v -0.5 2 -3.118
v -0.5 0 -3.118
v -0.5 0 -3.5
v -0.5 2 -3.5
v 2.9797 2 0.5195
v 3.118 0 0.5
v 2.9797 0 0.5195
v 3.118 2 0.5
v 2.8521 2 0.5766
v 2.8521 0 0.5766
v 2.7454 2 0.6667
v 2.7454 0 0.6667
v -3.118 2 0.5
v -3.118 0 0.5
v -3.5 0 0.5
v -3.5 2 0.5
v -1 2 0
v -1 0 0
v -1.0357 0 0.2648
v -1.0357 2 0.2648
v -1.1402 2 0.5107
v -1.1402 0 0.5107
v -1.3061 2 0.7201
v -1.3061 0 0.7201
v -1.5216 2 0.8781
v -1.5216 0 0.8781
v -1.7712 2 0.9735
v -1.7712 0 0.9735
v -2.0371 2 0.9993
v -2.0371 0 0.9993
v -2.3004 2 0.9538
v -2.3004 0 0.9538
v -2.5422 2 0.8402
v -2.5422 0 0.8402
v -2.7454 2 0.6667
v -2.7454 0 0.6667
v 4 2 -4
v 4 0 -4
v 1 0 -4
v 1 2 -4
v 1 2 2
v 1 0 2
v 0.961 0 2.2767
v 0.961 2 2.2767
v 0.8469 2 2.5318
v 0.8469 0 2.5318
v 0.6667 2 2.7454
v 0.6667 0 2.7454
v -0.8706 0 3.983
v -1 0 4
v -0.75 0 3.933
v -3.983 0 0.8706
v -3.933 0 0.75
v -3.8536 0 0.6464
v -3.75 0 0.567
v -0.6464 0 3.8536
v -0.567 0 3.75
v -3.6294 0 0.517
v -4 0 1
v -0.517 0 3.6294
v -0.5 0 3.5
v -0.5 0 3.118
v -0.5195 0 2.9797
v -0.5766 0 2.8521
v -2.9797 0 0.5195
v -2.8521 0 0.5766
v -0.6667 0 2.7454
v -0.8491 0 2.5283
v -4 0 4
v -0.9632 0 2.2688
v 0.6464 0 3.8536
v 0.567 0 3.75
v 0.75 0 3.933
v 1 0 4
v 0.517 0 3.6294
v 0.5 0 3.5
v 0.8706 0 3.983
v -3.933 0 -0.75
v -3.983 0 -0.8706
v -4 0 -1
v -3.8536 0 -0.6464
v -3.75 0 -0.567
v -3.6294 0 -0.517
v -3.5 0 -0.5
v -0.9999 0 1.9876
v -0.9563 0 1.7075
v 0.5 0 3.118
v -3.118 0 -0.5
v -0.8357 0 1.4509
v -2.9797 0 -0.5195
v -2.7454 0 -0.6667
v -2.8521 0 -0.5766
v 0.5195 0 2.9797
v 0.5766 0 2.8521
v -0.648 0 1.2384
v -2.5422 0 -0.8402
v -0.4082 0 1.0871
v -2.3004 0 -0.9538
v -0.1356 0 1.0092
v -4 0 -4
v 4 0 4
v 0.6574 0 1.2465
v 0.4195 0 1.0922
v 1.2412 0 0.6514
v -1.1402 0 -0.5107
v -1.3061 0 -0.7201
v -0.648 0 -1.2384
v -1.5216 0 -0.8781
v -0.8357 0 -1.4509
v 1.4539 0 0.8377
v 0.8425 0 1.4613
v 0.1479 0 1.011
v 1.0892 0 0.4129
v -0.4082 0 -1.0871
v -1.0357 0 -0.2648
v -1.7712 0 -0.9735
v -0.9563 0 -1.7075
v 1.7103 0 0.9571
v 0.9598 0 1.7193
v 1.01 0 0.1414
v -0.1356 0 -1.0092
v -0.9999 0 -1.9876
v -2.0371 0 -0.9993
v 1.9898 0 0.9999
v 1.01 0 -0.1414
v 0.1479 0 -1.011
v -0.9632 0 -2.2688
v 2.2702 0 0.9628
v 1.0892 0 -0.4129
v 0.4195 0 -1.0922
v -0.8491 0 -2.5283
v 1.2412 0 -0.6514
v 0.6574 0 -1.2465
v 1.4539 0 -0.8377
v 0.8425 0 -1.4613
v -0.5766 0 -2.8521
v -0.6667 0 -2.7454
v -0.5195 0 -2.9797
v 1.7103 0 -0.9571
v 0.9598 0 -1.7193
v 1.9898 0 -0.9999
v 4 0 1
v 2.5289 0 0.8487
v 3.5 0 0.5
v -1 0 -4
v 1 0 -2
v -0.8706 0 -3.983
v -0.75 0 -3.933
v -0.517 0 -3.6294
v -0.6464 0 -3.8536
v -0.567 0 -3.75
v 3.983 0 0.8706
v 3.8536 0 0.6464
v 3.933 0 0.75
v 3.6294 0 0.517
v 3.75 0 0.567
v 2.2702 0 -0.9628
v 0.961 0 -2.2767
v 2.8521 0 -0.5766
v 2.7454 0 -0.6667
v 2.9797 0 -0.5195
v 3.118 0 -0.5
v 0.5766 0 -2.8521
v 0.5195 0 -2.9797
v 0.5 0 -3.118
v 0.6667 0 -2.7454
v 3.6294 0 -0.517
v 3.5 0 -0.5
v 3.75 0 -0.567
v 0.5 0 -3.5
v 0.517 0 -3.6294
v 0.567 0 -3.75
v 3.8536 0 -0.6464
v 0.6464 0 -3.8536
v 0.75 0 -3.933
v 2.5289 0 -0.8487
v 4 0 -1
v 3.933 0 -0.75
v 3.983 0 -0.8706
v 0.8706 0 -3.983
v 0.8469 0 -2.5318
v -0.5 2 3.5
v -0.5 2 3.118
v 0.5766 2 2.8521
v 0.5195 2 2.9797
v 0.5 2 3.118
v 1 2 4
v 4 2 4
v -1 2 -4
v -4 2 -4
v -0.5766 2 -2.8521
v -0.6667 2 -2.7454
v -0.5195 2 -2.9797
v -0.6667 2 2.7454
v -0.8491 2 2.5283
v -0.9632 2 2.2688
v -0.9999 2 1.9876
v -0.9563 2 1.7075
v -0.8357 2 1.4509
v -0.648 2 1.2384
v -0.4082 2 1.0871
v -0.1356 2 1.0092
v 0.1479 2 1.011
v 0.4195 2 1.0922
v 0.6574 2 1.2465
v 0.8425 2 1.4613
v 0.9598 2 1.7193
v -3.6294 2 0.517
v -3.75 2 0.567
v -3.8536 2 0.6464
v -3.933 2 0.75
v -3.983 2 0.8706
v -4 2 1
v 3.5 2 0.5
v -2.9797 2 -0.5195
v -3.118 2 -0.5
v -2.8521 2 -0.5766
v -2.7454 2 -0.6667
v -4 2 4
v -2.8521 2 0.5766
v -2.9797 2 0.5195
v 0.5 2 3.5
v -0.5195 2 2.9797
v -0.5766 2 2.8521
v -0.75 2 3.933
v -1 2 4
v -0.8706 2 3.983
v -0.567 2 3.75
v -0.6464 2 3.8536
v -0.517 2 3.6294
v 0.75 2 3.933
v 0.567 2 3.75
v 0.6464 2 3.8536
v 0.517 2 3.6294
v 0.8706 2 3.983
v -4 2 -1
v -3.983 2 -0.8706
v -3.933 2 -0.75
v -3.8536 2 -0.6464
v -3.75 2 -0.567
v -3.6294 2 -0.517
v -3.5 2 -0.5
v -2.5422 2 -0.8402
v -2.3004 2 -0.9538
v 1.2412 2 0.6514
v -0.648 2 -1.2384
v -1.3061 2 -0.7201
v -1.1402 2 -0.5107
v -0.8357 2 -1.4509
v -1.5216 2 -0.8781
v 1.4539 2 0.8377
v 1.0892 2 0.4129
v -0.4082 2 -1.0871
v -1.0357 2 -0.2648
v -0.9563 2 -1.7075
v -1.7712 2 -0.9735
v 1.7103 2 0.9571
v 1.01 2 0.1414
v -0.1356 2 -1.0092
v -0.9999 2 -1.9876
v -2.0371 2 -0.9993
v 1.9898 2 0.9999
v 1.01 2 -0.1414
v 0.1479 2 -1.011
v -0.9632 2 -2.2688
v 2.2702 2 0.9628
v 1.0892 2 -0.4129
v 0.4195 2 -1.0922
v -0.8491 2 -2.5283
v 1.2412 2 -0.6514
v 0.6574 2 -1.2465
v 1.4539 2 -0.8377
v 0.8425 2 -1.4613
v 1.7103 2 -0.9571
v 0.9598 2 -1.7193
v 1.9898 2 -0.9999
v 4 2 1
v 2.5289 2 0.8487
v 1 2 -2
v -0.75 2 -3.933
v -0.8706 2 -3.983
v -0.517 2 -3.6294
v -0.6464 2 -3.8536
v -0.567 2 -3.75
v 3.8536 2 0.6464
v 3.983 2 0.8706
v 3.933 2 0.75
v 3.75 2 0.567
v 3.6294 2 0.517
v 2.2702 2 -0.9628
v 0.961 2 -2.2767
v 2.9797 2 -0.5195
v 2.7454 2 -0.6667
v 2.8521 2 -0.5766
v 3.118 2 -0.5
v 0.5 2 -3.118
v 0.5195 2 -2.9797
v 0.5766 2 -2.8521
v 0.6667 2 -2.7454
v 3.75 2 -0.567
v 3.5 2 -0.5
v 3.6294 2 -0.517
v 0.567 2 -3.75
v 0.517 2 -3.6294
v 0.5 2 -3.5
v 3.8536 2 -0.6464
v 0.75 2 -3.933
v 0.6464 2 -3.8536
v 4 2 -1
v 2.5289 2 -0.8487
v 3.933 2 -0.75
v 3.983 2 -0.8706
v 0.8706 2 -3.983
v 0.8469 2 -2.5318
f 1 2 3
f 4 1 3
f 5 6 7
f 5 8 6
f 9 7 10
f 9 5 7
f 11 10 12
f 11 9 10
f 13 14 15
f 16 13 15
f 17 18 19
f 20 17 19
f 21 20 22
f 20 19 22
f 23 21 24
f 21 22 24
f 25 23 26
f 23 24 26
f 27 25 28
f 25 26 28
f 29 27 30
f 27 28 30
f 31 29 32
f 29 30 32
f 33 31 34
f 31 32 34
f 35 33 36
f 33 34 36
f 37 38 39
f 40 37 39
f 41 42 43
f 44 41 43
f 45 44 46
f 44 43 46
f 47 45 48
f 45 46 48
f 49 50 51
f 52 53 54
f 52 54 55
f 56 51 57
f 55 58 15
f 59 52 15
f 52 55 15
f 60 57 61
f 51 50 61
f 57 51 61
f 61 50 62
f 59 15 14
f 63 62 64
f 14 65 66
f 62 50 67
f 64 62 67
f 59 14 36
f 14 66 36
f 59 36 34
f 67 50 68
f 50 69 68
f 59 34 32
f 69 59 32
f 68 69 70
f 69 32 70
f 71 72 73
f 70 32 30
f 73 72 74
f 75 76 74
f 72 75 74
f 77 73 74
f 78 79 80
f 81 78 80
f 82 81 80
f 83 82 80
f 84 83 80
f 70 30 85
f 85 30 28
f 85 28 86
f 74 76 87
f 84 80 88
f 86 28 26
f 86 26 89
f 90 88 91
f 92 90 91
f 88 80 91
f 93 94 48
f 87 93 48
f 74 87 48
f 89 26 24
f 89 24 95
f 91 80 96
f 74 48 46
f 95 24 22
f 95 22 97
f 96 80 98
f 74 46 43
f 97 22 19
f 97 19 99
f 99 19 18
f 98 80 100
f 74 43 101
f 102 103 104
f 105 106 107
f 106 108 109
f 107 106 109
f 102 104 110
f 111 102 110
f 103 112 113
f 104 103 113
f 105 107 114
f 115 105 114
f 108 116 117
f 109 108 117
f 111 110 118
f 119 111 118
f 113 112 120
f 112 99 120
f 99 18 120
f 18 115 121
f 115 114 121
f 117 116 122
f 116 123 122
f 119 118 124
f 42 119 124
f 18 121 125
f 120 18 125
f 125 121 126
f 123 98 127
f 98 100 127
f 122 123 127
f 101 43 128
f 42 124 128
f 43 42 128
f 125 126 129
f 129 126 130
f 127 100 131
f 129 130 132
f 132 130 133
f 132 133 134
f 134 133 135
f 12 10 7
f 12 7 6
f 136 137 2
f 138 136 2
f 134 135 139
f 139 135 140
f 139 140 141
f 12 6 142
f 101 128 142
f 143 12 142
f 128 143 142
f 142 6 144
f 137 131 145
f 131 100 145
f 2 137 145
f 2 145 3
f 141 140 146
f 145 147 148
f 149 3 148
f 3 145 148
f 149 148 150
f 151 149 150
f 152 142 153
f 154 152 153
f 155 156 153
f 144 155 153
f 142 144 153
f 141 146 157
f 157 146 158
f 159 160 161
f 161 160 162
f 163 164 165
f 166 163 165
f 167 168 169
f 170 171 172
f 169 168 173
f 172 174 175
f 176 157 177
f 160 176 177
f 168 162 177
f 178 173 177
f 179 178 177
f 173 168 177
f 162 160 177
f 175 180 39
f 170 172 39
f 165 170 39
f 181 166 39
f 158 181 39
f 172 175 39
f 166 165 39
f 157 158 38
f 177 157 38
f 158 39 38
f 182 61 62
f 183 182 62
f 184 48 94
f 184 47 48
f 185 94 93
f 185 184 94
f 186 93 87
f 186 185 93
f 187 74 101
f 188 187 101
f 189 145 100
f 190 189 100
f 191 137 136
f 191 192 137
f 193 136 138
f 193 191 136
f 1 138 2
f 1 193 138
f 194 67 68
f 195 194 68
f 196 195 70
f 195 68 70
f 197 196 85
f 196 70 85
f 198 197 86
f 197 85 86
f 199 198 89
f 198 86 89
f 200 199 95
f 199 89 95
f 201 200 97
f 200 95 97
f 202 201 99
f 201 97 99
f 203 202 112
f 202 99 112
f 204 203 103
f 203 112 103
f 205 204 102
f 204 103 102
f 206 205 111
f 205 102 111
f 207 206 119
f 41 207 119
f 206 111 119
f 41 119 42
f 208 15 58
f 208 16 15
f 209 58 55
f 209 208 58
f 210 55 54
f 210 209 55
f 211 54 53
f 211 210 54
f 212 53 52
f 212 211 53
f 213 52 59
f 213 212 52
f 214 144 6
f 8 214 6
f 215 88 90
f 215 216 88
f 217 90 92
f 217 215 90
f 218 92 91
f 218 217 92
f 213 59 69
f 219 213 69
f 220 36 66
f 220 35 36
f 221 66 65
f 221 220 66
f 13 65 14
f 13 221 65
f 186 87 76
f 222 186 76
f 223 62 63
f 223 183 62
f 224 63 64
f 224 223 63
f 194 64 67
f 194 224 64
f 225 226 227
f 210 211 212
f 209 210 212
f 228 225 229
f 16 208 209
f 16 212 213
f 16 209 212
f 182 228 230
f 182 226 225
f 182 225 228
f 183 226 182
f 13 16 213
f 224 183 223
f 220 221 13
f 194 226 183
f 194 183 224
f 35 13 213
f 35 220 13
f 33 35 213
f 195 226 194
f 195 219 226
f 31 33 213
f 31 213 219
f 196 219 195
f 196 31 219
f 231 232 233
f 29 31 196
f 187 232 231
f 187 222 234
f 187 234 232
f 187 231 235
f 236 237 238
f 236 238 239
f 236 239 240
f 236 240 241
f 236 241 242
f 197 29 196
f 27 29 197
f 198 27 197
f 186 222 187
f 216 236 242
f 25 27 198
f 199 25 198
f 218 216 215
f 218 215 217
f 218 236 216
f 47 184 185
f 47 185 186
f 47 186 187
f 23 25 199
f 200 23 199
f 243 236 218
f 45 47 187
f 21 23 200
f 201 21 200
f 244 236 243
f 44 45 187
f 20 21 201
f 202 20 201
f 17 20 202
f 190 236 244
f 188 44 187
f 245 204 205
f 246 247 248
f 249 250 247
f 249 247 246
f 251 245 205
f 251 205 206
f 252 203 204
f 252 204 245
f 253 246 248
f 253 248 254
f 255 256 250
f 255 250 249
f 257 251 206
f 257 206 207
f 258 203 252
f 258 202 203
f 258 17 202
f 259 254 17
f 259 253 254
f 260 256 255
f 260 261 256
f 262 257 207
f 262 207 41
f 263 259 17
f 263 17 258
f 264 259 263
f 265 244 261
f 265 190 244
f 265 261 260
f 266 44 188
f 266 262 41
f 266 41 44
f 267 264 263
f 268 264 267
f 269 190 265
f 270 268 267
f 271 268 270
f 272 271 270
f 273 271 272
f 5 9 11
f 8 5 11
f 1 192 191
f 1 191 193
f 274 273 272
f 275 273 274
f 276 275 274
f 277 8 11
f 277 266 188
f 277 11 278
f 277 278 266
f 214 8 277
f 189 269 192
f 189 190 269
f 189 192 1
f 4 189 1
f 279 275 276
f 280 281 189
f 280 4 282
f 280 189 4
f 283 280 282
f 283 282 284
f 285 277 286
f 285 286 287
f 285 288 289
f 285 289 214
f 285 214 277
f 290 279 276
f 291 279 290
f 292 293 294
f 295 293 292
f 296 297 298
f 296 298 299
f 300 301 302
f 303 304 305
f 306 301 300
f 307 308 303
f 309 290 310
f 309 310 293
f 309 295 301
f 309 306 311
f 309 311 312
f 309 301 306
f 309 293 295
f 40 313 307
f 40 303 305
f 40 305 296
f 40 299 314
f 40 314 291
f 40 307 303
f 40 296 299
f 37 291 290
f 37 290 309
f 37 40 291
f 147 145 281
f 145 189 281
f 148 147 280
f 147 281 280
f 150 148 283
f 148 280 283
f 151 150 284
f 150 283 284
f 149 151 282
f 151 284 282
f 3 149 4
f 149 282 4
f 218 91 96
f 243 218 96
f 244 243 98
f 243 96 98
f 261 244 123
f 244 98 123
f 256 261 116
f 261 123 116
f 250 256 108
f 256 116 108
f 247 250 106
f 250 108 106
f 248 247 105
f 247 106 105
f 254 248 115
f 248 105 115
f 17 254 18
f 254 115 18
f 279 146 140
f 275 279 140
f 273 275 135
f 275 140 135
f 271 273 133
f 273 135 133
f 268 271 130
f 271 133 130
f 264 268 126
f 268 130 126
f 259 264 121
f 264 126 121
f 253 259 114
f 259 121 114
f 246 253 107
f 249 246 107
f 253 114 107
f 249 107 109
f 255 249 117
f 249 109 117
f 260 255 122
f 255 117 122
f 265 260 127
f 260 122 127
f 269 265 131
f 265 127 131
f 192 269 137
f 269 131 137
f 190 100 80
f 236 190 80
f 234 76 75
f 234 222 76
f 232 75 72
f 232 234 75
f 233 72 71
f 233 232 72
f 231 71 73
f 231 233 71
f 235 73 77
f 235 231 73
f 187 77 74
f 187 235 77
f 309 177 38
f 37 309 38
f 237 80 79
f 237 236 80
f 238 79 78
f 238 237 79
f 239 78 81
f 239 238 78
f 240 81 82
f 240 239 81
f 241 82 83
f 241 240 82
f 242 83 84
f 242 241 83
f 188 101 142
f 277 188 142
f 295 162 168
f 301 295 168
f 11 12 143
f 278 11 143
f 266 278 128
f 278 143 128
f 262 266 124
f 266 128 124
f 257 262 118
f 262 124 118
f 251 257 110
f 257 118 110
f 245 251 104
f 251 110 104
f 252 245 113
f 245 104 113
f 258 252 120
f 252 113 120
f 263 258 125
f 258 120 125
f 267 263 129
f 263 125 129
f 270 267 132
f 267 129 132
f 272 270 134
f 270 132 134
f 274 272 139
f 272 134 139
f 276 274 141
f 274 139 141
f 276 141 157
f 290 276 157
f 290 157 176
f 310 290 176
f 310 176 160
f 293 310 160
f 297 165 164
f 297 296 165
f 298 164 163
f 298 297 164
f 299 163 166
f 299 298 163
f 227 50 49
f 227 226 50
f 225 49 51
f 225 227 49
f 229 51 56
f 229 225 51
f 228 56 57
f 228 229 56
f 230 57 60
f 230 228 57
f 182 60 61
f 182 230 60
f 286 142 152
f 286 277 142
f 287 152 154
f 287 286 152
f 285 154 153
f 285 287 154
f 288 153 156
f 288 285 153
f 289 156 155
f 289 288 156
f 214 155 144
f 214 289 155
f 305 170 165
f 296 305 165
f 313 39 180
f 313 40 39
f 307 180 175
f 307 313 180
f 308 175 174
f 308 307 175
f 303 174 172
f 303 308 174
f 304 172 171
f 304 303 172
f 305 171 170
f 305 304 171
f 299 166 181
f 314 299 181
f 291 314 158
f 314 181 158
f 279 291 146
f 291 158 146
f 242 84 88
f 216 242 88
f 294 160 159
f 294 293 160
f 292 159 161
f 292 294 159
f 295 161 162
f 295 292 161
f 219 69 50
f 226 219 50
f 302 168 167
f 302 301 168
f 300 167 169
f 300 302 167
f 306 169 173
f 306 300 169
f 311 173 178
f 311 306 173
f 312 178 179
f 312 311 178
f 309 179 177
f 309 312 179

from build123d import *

# Parameters (mm, degrees)
BOSS_EXTRUDE1_DEPTH = 2
FILLET1_R           = 0.5


with BuildPart() as part:
    # Sketch1 → Boss-Extrude1 (new body)
    with BuildSketch(Plane(origin=(0, 0, 0), x_dir=(1, 0, 0), z_dir=(0, 1, 0))):
        with BuildLine():
            Line((-0.5, 4), (-4, 4))
            Line((-4, 4), (-4, 0.5))
            Line((-4, 0.5), (-2.866025404, 0.5))
            ThreePointArc((-2.866025404, 0.5), (-1.741180955, 0.965925826), (-1, 0))
            ThreePointArc((-1, 0), (-1.741180955, -0.965925826), (-2.866025404, -0.5))
            Line((-2.866025404, -0.5), (-4, -0.5))
            Line((-4, -0.5), (-4, -4))
            Line((-4, -4), (-0.5, -4))
            Line((-0.5, -4), (-0.5, -2.866025404))
            ThreePointArc((-0.5, -2.866025404), (-0.5, -1.133974596), (1, -2))
            ThreePointArc((1, -2), (0.866025404, -2.5), (0.5, -2.866025404))
            Line((0.5, -2.866025404), (0.5, -4))
            Line((0.5, -4), (4, -4))
            Line((4, -4), (4, -0.5))
            Line((4, -0.5), (2.866025404, -0.5))
            ThreePointArc((2.866025404, -0.5), (1, 0), (2.866025404, 0.5))
            Line((2.866025404, 0.5), (4, 0.5))
            Line((4, 0.5), (4, 4))
            Line((4, 4), (0.5, 4))
            Line((0.5, 4), (0.5, 2.866025404))
            ThreePointArc((0.5, 2.866025404), (0.866025404, 2.5), (1, 2))
            ThreePointArc((1, 2), (-0.5, 1.133974596), (-0.5, 2.866025404))
            Line((-0.5, 2.866025404), (-0.5, 4))
        make_face()
    extrude(amount=BOSS_EXTRUDE1_DEPTH)

    # Fillet1
    fillet1_edges = [part.edges().sort_by_distance(p)[0] for p in [
        (-2.866025404, 1, -0.5),
        (-4, 1, -0.5),
        (-0.5, 1, -4),
        (-0.5, 1, -2.866025404),
        (0.5, 1, -2.866025404),
        (0.5, 1, -4),
        (4, 1, -0.5),
        (2.866025404, 1, -0.5),
        (2.866025404, 1, 0.5),
        (4, 1, 0.5),
        (0.5, 1, 4),
        (0.5, 1, 2.866025404),
        (-0.5, 1, 2.866025404),
        (-0.5, 1, 4),
        (-4, 1, 0.5),
        (-2.866025404, 1, 0.5),
    ]]
    fillet(fillet1_edges, radius=FILLET1_R)


solid = part.part
